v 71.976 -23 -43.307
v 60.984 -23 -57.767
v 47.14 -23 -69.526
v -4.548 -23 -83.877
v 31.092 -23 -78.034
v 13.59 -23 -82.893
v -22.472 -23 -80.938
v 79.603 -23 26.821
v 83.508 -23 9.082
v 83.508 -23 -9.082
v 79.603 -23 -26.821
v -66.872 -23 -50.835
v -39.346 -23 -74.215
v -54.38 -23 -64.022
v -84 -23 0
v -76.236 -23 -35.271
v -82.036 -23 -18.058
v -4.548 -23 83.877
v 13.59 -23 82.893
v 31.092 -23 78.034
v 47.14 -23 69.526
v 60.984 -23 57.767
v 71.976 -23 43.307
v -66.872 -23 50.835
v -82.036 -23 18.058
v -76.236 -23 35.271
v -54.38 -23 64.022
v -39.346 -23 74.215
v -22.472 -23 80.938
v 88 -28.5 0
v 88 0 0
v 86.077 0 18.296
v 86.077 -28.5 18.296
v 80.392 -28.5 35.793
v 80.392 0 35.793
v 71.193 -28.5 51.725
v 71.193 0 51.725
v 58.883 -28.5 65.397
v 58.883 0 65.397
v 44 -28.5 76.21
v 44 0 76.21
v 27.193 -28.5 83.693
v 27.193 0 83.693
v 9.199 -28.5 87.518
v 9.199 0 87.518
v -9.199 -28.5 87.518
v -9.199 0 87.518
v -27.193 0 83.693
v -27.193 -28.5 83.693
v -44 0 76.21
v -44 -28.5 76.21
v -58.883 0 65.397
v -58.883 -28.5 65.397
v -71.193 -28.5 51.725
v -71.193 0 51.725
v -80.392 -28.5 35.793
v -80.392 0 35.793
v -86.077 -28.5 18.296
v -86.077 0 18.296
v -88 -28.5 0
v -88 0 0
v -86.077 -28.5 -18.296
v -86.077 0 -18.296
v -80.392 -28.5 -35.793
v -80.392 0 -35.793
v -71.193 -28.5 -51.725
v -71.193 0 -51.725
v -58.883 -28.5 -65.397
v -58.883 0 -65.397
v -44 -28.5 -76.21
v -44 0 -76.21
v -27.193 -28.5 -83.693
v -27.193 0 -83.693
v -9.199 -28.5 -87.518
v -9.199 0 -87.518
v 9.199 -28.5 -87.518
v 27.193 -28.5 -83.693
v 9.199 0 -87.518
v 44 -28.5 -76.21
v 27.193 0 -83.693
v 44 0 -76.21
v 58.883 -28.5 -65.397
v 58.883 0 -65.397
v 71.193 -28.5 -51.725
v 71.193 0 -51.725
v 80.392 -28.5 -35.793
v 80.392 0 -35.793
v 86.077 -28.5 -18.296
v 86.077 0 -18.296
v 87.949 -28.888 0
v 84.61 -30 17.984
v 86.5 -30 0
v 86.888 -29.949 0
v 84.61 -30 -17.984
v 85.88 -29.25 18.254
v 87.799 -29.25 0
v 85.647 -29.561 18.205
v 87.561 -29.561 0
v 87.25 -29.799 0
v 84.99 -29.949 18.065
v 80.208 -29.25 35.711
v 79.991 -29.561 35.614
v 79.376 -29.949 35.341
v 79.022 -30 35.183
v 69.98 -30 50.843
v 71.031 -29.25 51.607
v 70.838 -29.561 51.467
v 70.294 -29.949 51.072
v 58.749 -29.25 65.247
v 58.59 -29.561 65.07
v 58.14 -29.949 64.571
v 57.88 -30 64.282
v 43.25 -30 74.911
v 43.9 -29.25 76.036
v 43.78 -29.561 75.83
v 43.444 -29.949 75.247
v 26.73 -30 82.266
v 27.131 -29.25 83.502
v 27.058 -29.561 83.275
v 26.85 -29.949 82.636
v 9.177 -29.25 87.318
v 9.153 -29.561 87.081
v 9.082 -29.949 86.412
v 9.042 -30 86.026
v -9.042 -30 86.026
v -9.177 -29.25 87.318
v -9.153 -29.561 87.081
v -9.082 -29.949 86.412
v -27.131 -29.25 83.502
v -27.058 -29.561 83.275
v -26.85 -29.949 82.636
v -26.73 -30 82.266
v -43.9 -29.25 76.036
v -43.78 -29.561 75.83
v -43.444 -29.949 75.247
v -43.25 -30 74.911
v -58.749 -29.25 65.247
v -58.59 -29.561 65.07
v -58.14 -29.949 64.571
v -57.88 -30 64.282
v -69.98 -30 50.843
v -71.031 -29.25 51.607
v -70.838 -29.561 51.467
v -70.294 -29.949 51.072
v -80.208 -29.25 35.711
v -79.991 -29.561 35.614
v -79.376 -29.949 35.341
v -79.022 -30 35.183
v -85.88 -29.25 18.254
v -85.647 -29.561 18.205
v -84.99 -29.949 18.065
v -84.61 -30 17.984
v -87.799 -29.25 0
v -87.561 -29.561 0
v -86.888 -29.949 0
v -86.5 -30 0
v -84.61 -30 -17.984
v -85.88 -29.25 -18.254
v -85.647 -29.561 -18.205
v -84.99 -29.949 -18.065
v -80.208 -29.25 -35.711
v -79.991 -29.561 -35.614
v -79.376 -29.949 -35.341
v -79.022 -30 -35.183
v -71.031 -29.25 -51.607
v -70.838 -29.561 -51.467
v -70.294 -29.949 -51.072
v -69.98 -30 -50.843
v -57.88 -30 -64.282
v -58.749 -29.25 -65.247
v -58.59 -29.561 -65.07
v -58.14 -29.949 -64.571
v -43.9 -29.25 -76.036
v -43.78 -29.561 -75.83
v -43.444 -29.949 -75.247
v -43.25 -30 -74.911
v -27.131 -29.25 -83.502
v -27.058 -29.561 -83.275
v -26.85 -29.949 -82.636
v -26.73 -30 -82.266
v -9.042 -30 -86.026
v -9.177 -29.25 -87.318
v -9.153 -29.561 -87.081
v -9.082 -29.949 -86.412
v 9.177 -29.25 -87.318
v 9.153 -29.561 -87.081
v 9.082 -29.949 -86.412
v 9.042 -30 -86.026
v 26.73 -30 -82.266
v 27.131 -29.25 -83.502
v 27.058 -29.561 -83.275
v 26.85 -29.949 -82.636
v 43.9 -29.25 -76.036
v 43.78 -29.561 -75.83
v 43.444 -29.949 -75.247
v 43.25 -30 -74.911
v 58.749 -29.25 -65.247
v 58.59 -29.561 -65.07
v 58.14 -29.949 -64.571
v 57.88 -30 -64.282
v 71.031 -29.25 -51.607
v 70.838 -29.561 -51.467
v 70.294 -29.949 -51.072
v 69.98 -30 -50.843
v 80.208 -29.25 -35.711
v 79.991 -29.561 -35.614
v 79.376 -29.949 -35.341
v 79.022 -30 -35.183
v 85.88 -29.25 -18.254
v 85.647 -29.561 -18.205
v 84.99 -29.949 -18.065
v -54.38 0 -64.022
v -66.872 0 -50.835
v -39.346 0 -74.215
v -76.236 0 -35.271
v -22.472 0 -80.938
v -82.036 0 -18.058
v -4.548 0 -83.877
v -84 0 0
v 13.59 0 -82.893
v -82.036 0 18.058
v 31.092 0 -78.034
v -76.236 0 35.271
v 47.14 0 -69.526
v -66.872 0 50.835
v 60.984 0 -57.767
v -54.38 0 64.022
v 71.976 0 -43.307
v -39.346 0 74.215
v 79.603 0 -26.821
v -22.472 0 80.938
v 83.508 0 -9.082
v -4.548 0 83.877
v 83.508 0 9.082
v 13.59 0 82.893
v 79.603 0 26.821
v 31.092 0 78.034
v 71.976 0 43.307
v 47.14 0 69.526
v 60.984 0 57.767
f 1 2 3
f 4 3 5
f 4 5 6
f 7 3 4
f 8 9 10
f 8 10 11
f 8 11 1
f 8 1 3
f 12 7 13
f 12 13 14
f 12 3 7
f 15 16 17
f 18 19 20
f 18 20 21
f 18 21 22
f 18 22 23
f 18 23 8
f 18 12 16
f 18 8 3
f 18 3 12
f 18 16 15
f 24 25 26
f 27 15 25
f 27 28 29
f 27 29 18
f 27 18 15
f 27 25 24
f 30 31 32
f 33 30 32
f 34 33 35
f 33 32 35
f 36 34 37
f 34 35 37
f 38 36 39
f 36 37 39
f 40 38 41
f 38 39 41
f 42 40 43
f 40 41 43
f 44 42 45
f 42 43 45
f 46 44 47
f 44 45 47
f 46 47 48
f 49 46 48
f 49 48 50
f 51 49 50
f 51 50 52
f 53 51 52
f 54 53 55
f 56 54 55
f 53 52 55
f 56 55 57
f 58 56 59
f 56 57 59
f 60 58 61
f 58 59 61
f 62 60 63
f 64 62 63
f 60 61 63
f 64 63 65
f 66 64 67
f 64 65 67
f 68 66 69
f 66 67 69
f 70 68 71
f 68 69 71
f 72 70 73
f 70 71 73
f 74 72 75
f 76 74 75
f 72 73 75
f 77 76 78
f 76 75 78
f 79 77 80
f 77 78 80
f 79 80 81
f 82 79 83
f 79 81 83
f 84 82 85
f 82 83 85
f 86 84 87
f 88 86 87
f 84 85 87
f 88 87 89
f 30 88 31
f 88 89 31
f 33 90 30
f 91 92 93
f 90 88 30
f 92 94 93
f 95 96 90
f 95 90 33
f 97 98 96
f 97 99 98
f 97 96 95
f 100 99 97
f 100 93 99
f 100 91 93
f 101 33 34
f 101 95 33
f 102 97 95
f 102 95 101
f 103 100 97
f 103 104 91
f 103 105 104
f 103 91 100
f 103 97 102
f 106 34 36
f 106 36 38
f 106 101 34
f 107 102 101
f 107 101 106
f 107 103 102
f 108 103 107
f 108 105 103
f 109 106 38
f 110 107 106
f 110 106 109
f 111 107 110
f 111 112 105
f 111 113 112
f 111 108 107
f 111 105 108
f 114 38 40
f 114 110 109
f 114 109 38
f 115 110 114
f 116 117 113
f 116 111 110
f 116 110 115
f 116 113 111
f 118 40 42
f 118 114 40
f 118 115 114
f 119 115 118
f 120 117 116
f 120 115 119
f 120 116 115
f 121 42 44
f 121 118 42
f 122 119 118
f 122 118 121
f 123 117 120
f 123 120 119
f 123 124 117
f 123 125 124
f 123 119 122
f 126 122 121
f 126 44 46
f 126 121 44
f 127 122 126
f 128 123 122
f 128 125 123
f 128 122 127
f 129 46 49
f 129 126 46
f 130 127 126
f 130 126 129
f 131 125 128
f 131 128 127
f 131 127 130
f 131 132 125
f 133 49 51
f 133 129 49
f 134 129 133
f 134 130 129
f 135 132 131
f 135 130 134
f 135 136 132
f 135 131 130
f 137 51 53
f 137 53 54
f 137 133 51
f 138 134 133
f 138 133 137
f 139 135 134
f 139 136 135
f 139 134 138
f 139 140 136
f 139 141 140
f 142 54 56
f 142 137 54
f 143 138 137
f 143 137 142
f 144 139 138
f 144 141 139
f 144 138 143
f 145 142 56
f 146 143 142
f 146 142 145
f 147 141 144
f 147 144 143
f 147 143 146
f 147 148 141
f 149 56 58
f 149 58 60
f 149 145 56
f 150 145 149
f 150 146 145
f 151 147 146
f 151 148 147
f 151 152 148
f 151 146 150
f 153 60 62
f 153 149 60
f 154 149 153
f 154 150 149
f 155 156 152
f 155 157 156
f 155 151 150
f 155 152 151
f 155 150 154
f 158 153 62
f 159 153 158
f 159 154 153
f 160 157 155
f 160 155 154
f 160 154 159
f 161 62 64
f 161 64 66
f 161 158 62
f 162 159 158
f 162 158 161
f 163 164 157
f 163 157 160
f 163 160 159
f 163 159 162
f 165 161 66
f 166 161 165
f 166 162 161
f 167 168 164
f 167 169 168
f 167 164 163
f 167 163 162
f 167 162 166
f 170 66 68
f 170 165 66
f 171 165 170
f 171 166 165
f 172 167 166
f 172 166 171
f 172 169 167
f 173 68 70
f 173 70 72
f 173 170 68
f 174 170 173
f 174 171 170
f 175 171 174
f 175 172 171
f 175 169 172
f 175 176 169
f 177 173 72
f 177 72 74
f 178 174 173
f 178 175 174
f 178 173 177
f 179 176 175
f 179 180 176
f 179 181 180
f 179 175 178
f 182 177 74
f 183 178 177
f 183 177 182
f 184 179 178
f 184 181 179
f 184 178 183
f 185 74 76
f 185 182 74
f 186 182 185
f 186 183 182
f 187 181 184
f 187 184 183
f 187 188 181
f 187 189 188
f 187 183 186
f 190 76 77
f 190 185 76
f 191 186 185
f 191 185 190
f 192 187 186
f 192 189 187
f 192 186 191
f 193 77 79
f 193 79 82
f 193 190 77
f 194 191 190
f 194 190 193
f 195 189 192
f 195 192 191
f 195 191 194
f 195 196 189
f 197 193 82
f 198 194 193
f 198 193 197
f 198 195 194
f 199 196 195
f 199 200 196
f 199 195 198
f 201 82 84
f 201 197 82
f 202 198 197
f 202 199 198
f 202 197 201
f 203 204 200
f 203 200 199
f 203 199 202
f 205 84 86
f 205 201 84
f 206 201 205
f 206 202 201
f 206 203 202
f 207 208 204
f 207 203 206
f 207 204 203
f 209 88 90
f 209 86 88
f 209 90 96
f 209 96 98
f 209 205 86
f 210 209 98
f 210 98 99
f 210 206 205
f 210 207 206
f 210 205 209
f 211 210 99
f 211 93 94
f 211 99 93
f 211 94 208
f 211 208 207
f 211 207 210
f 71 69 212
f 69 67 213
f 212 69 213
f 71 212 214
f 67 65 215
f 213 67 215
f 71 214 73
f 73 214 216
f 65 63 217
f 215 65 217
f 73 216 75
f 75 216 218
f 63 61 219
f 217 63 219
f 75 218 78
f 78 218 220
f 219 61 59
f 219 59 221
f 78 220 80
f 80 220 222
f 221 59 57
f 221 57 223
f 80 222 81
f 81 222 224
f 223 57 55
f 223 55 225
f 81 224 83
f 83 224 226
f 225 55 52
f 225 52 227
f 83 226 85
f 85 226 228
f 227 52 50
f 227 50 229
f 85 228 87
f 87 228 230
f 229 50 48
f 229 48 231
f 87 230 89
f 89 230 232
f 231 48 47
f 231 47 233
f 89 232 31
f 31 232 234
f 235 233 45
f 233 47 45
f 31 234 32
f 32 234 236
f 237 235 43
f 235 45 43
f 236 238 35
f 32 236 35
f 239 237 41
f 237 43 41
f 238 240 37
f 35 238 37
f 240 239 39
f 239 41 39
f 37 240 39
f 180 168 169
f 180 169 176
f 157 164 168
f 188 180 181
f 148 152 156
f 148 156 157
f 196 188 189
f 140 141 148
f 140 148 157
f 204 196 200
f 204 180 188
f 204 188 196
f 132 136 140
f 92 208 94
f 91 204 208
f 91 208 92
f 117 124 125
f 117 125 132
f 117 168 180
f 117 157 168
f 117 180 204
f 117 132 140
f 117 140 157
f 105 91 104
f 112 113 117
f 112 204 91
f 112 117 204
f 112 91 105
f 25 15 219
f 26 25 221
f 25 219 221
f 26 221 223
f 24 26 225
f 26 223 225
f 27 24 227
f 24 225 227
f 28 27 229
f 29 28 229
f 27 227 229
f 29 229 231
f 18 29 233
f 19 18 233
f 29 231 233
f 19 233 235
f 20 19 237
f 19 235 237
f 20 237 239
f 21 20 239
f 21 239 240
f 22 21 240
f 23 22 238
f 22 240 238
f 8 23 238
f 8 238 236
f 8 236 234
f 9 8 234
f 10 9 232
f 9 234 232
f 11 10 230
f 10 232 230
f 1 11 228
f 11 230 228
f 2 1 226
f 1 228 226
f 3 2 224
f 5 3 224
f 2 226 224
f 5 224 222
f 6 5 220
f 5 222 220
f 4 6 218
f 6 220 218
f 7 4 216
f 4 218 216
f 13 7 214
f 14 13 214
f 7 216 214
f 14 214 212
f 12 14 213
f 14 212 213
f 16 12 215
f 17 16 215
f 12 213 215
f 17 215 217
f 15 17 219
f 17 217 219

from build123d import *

# Parameters (mm, degrees)
F0_R     = 88
F1_DEPTH = 30
F2_R     = 84
F3_DEPTH = 23
F4_R     = 1.5


# Not quite as in the source:
# - a feature names something its author has since deleted; it is built from what else it names


with BuildPart() as f1:
    # F0 (on Front) → F1 (new body)
    with BuildSketch(Plane.XZ):
        Circle(F0_R)
    extrude(amount=F1_DEPTH)

    # F2 (on face) → F3 (cut)
    with BuildSketch(Plane(origin=(0, 0, 0), x_dir=(-1, 0, 0), z_dir=(0, 1, 0))):
        Circle(F2_R)
    extrude(amount=-F3_DEPTH, mode=Mode.SUBTRACT)

    # F4
    f4_edges = [f1.edges().sort_by_distance(p)[0] for p in [
        (-88, -30, 0),
    ]]
    fillet(f4_edges, radius=F4_R)


solid = f1.part
